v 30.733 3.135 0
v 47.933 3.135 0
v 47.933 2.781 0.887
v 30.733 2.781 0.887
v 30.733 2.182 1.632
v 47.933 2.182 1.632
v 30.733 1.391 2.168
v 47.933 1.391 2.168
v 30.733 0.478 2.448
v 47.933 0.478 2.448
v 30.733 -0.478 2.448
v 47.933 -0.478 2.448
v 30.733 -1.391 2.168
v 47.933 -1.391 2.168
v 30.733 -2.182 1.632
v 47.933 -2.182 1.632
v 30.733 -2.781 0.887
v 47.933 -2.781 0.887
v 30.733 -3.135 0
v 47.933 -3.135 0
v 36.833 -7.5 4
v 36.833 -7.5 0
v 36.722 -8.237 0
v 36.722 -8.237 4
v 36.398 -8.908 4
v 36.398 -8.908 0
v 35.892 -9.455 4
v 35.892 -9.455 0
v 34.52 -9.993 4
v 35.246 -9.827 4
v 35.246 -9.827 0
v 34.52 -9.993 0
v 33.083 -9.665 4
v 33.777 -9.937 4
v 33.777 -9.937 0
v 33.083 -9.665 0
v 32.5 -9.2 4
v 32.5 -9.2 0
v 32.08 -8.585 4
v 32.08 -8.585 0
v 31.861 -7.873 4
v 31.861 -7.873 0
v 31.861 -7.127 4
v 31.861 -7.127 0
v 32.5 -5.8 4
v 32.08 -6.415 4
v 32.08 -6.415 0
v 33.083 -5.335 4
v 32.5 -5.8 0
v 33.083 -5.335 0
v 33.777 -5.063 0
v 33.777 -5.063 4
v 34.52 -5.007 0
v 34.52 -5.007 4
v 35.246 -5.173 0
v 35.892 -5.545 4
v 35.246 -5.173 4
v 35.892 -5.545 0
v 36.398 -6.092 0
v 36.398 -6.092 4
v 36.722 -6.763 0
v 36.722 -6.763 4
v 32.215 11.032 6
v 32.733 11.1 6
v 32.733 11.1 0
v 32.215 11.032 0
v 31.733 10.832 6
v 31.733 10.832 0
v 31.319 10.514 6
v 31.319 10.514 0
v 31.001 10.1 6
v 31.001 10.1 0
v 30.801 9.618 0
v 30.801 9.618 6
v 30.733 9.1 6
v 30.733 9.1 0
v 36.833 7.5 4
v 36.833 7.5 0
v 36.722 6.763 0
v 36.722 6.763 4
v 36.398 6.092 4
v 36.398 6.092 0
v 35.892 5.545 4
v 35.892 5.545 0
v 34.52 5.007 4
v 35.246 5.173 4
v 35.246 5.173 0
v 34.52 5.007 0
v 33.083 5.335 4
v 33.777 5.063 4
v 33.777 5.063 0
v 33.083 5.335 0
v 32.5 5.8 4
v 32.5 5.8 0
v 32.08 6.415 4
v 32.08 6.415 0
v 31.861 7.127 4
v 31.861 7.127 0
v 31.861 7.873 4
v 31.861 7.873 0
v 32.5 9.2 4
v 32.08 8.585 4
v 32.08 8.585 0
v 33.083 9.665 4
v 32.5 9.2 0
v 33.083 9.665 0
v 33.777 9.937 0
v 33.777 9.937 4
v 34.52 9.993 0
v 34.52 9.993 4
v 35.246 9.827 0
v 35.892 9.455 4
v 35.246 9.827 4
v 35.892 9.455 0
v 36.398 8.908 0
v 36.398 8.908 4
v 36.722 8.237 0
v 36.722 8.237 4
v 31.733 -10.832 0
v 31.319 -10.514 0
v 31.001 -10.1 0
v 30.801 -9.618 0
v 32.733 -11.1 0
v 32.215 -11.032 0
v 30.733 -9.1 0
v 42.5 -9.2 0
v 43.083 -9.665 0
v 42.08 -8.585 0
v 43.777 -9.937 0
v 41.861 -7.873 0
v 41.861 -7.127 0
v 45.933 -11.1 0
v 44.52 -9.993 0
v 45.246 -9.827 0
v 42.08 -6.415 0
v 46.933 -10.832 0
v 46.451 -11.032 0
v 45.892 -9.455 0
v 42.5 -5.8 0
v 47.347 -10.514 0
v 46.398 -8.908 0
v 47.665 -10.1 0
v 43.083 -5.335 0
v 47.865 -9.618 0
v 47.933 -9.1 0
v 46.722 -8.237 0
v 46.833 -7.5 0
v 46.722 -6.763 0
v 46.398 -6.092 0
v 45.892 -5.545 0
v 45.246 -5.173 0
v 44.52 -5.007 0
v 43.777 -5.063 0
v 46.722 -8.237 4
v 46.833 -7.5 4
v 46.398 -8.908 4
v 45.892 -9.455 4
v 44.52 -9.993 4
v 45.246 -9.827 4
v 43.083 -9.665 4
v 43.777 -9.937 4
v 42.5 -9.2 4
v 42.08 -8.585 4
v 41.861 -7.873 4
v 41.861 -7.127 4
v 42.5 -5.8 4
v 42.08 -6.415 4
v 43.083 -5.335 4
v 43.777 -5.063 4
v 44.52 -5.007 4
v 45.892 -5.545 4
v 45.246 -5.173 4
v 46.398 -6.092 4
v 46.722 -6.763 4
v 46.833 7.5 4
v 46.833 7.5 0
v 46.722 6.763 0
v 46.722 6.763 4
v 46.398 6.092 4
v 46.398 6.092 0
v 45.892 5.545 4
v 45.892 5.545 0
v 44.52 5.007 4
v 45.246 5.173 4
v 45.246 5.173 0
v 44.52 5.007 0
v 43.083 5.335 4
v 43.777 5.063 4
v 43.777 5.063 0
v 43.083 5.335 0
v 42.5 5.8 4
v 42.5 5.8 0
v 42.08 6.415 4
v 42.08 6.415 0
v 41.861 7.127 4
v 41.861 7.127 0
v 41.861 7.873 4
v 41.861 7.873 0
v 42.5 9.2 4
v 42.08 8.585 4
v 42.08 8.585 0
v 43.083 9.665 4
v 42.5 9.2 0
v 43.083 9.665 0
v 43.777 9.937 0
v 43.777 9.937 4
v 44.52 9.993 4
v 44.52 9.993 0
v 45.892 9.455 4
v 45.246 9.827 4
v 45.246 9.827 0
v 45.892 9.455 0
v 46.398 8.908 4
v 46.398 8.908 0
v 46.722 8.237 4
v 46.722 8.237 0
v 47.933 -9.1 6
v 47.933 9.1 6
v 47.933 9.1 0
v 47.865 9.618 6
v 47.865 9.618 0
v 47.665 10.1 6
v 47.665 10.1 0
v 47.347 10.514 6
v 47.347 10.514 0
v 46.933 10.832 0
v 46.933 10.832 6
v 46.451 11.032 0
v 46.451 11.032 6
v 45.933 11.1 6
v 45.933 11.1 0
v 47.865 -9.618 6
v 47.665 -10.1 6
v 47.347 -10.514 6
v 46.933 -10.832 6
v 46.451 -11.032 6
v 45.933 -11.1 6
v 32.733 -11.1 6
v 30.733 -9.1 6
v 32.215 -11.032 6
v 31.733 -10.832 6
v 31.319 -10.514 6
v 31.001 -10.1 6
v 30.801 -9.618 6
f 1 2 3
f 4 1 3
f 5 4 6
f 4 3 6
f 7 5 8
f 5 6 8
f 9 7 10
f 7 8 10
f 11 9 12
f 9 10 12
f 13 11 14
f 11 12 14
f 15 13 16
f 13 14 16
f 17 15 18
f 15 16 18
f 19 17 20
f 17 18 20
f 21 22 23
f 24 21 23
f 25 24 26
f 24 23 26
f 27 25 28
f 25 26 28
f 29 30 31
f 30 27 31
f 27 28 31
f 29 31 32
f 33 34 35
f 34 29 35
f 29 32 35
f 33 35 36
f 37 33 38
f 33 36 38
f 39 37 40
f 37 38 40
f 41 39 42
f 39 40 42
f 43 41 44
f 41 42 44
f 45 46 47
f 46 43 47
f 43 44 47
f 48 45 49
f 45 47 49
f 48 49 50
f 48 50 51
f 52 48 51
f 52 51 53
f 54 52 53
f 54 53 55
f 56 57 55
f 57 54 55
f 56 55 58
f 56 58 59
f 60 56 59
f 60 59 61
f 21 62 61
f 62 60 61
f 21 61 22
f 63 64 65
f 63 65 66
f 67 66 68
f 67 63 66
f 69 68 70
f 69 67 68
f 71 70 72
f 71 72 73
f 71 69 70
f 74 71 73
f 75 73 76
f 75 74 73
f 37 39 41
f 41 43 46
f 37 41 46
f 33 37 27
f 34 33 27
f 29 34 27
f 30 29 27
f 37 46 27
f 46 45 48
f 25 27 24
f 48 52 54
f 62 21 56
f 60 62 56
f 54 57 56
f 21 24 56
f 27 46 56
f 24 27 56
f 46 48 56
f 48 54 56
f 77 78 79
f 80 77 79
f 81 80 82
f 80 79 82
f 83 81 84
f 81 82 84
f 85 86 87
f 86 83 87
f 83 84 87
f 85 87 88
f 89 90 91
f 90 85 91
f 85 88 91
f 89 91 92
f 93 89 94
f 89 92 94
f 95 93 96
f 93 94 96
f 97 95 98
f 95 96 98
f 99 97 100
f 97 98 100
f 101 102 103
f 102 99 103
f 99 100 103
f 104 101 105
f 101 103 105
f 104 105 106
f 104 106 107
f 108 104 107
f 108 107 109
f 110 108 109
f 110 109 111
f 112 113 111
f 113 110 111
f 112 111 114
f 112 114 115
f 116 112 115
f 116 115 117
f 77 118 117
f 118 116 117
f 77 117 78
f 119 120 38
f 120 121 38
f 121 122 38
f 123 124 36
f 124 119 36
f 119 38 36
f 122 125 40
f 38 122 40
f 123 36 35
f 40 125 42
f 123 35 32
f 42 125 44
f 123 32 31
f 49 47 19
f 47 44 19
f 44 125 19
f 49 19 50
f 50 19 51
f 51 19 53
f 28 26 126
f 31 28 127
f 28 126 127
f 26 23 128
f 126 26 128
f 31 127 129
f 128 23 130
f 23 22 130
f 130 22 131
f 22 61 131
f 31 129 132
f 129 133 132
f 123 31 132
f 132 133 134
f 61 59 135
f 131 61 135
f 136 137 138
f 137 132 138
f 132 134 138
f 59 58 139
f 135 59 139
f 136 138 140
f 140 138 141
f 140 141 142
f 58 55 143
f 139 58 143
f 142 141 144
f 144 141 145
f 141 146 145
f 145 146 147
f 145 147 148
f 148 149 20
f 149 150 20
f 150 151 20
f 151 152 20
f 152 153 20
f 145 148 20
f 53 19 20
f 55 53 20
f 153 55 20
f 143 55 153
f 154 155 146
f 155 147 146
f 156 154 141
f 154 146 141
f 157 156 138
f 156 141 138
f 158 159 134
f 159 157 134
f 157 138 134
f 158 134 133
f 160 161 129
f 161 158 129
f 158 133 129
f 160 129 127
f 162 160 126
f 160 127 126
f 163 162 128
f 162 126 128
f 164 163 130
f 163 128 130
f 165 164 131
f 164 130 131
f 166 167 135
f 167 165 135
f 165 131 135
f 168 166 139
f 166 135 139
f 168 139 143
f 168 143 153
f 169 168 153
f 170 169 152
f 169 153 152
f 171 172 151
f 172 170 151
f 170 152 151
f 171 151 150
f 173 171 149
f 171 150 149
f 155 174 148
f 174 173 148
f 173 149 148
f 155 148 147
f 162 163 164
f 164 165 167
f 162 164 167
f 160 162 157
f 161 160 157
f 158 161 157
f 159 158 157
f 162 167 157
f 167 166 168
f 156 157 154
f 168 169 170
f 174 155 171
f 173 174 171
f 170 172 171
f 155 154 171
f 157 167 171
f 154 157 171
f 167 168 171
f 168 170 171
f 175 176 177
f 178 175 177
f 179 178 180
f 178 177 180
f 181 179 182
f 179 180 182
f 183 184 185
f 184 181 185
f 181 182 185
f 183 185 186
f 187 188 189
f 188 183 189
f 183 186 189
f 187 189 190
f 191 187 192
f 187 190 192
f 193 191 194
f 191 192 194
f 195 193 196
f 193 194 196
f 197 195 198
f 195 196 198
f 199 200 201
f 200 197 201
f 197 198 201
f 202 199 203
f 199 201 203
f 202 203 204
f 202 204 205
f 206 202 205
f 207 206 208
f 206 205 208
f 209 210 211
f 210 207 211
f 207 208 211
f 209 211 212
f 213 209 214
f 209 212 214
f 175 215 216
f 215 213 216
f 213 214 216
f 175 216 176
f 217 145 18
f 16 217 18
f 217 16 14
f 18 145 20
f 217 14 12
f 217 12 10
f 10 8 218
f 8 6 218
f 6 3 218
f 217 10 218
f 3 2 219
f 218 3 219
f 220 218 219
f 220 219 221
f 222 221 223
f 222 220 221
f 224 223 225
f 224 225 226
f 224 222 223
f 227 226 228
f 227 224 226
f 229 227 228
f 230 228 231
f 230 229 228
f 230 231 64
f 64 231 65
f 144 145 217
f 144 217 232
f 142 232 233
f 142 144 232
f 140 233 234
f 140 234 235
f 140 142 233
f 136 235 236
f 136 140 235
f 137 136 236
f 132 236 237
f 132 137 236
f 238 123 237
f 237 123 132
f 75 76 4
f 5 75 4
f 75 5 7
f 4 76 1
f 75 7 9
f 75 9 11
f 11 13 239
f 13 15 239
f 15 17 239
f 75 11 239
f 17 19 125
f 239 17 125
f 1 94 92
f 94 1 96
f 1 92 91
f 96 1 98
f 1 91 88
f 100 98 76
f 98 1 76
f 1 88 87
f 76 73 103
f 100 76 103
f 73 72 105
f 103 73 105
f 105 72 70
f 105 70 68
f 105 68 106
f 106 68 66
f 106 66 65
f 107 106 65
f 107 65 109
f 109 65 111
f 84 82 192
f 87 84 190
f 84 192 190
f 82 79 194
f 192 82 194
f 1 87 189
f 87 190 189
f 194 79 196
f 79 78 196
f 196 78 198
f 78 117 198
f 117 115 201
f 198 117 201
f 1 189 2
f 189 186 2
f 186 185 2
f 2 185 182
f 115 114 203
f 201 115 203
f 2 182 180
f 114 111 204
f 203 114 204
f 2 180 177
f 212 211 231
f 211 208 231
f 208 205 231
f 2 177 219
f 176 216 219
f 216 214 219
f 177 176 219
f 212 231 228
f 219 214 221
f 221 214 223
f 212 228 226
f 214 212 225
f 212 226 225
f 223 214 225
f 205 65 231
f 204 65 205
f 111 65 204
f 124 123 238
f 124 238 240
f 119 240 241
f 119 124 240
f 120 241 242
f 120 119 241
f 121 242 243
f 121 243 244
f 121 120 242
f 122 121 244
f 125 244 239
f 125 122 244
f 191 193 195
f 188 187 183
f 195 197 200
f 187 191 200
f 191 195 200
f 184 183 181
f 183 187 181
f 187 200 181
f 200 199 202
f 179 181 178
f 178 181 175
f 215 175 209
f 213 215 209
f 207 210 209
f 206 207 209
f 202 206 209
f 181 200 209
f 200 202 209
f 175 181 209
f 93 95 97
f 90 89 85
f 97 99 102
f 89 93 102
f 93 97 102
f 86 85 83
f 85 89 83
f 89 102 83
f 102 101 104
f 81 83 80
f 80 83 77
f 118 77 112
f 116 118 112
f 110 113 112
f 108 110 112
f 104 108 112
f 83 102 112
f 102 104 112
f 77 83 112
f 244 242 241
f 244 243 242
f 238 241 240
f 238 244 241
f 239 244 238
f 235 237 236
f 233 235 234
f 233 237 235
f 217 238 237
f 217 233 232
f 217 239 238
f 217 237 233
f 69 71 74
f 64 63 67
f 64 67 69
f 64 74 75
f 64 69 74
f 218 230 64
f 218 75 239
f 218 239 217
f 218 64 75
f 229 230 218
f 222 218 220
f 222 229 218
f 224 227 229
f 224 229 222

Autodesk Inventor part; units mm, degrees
ref_plane "YZ Plane" through (0, 0, 0) normal (1, 0, 0) x (0, 1, 0)
ref_plane "XZ Plane" through (0, 0, 0) normal (0, 1, 0) x (-1, 0, 0)
ref_plane "XY Plane" through (0, 0, 0) normal (0, 0, 1) x (1, 0, 0)
ref_plane "Arbeitsebene1" through (0, 0, 0) normal (0, 0, 1) x (1, 0, 0)
sketch "Skizze1" plane through (0, 0, 0) normal (0, 0, 1) x (1, 0, 0)
  circle A0 centre (34.3329, 7.5) radius 3.25 construction
  circle A1 centre (44.3329, 7.5) radius 3.25 construction
  circle A2 centre (34.3329, -7.5) radius 3.25 construction
  circle A3 centre (44.3329, -7.5) radius 3.25 construction
  line L0 (34.3329, 7.5) -> (44.3329, 7.5) construction
  line L1 (44.3329, 7.5) -> (44.3329, -7.5) construction
  line L2 (44.3329, -7.5) -> (34.3329, -7.5) construction
  line L3 (34.3329, -7.5) -> (34.3329, 7.5) construction
  line L4 (47.9329, 11.1) -> (30.7329, 11.1)
  line L5 (30.7329, 11.1) -> (30.7329, -11.1)
  line L6 (30.7329, -11.1) -> (47.9329, -11.1)
  line L7 (47.9329, -11.1) -> (47.9329, 11.1)
  circle A4 centre (34.3329, 7.5) radius 2.5
  circle A5 centre (44.3329, 7.5) radius 2.5
  circle A6 centre (34.3329, -7.5) radius 2.5
  circle A7 centre (44.3329, -7.5) radius 2.5
  point P0 (0, 0)
  dimension "d0" = 3.6
  dimension "d1" = 5
  dimension "d2" = 5
  dimension "d3" = 5
  dimension "d4" = 5
extrude "Extrusion1" add sketch "Skizze1" along normal blind 4
sketch "Skizze2" plane through (0, 0, 4) normal (0, 0, 1) x (1, 0, 0)
  line L0 (30.7329, 11.1) -> (30.7329, -11.1) projected
  line L1 (30.7329, -11.1) -> (47.9329, -11.1) projected
  line L2 (47.9329, -11.1) -> (47.9329, 11.1) projected
  line L3 (47.9329, 11.1) -> (30.7329, 11.1) projected
  circle A0 centre (34.3329, 7.5) radius 2.5 projected
  circle A1 centre (44.3329, 7.5) radius 2.5 projected
  circle A2 centre (34.3329, -7.5) radius 2.5 projected
  circle A3 centre (44.3329, -7.5) radius 2.5 projected
  point P0 (0, 0)
extrude "Extrusion2" add sketch "Skizze2" along normal blind 2 contours L3 L2 L1 L0 | A0 | A1 | A2 | A3
sketch "Skizze3" plane through (47.9329, -11.1, 0) normal (1, 0, 0) x (0, 0, -1)
  circle A0 centre (0, 11.1) radius 3.22 projected
  circle A1 centre (0.7362, 11.1) radius 3.22
  point P0 (0, 11.1)
  dimension "d9" = 6.44
  dimension "d10" = 6.44
extrude "Extrusion3" cut sketch "Skizze3" against normal through all contours A0 A1 | A0 A1 picked at (-0.5511, 10.842) picked at (3.403, 11.6139)
fillet "Rundung1" radius 2 4 edges at (47.9329, -11.1, 3) (47.9329, 11.1, 3) (30.7329, 11.1, 3) (30.7329, -11.1, 3)
equation "\"d10\" = d9"
properties part number "20_Cube_Insert_Template_magnetic_clamp_v3"
